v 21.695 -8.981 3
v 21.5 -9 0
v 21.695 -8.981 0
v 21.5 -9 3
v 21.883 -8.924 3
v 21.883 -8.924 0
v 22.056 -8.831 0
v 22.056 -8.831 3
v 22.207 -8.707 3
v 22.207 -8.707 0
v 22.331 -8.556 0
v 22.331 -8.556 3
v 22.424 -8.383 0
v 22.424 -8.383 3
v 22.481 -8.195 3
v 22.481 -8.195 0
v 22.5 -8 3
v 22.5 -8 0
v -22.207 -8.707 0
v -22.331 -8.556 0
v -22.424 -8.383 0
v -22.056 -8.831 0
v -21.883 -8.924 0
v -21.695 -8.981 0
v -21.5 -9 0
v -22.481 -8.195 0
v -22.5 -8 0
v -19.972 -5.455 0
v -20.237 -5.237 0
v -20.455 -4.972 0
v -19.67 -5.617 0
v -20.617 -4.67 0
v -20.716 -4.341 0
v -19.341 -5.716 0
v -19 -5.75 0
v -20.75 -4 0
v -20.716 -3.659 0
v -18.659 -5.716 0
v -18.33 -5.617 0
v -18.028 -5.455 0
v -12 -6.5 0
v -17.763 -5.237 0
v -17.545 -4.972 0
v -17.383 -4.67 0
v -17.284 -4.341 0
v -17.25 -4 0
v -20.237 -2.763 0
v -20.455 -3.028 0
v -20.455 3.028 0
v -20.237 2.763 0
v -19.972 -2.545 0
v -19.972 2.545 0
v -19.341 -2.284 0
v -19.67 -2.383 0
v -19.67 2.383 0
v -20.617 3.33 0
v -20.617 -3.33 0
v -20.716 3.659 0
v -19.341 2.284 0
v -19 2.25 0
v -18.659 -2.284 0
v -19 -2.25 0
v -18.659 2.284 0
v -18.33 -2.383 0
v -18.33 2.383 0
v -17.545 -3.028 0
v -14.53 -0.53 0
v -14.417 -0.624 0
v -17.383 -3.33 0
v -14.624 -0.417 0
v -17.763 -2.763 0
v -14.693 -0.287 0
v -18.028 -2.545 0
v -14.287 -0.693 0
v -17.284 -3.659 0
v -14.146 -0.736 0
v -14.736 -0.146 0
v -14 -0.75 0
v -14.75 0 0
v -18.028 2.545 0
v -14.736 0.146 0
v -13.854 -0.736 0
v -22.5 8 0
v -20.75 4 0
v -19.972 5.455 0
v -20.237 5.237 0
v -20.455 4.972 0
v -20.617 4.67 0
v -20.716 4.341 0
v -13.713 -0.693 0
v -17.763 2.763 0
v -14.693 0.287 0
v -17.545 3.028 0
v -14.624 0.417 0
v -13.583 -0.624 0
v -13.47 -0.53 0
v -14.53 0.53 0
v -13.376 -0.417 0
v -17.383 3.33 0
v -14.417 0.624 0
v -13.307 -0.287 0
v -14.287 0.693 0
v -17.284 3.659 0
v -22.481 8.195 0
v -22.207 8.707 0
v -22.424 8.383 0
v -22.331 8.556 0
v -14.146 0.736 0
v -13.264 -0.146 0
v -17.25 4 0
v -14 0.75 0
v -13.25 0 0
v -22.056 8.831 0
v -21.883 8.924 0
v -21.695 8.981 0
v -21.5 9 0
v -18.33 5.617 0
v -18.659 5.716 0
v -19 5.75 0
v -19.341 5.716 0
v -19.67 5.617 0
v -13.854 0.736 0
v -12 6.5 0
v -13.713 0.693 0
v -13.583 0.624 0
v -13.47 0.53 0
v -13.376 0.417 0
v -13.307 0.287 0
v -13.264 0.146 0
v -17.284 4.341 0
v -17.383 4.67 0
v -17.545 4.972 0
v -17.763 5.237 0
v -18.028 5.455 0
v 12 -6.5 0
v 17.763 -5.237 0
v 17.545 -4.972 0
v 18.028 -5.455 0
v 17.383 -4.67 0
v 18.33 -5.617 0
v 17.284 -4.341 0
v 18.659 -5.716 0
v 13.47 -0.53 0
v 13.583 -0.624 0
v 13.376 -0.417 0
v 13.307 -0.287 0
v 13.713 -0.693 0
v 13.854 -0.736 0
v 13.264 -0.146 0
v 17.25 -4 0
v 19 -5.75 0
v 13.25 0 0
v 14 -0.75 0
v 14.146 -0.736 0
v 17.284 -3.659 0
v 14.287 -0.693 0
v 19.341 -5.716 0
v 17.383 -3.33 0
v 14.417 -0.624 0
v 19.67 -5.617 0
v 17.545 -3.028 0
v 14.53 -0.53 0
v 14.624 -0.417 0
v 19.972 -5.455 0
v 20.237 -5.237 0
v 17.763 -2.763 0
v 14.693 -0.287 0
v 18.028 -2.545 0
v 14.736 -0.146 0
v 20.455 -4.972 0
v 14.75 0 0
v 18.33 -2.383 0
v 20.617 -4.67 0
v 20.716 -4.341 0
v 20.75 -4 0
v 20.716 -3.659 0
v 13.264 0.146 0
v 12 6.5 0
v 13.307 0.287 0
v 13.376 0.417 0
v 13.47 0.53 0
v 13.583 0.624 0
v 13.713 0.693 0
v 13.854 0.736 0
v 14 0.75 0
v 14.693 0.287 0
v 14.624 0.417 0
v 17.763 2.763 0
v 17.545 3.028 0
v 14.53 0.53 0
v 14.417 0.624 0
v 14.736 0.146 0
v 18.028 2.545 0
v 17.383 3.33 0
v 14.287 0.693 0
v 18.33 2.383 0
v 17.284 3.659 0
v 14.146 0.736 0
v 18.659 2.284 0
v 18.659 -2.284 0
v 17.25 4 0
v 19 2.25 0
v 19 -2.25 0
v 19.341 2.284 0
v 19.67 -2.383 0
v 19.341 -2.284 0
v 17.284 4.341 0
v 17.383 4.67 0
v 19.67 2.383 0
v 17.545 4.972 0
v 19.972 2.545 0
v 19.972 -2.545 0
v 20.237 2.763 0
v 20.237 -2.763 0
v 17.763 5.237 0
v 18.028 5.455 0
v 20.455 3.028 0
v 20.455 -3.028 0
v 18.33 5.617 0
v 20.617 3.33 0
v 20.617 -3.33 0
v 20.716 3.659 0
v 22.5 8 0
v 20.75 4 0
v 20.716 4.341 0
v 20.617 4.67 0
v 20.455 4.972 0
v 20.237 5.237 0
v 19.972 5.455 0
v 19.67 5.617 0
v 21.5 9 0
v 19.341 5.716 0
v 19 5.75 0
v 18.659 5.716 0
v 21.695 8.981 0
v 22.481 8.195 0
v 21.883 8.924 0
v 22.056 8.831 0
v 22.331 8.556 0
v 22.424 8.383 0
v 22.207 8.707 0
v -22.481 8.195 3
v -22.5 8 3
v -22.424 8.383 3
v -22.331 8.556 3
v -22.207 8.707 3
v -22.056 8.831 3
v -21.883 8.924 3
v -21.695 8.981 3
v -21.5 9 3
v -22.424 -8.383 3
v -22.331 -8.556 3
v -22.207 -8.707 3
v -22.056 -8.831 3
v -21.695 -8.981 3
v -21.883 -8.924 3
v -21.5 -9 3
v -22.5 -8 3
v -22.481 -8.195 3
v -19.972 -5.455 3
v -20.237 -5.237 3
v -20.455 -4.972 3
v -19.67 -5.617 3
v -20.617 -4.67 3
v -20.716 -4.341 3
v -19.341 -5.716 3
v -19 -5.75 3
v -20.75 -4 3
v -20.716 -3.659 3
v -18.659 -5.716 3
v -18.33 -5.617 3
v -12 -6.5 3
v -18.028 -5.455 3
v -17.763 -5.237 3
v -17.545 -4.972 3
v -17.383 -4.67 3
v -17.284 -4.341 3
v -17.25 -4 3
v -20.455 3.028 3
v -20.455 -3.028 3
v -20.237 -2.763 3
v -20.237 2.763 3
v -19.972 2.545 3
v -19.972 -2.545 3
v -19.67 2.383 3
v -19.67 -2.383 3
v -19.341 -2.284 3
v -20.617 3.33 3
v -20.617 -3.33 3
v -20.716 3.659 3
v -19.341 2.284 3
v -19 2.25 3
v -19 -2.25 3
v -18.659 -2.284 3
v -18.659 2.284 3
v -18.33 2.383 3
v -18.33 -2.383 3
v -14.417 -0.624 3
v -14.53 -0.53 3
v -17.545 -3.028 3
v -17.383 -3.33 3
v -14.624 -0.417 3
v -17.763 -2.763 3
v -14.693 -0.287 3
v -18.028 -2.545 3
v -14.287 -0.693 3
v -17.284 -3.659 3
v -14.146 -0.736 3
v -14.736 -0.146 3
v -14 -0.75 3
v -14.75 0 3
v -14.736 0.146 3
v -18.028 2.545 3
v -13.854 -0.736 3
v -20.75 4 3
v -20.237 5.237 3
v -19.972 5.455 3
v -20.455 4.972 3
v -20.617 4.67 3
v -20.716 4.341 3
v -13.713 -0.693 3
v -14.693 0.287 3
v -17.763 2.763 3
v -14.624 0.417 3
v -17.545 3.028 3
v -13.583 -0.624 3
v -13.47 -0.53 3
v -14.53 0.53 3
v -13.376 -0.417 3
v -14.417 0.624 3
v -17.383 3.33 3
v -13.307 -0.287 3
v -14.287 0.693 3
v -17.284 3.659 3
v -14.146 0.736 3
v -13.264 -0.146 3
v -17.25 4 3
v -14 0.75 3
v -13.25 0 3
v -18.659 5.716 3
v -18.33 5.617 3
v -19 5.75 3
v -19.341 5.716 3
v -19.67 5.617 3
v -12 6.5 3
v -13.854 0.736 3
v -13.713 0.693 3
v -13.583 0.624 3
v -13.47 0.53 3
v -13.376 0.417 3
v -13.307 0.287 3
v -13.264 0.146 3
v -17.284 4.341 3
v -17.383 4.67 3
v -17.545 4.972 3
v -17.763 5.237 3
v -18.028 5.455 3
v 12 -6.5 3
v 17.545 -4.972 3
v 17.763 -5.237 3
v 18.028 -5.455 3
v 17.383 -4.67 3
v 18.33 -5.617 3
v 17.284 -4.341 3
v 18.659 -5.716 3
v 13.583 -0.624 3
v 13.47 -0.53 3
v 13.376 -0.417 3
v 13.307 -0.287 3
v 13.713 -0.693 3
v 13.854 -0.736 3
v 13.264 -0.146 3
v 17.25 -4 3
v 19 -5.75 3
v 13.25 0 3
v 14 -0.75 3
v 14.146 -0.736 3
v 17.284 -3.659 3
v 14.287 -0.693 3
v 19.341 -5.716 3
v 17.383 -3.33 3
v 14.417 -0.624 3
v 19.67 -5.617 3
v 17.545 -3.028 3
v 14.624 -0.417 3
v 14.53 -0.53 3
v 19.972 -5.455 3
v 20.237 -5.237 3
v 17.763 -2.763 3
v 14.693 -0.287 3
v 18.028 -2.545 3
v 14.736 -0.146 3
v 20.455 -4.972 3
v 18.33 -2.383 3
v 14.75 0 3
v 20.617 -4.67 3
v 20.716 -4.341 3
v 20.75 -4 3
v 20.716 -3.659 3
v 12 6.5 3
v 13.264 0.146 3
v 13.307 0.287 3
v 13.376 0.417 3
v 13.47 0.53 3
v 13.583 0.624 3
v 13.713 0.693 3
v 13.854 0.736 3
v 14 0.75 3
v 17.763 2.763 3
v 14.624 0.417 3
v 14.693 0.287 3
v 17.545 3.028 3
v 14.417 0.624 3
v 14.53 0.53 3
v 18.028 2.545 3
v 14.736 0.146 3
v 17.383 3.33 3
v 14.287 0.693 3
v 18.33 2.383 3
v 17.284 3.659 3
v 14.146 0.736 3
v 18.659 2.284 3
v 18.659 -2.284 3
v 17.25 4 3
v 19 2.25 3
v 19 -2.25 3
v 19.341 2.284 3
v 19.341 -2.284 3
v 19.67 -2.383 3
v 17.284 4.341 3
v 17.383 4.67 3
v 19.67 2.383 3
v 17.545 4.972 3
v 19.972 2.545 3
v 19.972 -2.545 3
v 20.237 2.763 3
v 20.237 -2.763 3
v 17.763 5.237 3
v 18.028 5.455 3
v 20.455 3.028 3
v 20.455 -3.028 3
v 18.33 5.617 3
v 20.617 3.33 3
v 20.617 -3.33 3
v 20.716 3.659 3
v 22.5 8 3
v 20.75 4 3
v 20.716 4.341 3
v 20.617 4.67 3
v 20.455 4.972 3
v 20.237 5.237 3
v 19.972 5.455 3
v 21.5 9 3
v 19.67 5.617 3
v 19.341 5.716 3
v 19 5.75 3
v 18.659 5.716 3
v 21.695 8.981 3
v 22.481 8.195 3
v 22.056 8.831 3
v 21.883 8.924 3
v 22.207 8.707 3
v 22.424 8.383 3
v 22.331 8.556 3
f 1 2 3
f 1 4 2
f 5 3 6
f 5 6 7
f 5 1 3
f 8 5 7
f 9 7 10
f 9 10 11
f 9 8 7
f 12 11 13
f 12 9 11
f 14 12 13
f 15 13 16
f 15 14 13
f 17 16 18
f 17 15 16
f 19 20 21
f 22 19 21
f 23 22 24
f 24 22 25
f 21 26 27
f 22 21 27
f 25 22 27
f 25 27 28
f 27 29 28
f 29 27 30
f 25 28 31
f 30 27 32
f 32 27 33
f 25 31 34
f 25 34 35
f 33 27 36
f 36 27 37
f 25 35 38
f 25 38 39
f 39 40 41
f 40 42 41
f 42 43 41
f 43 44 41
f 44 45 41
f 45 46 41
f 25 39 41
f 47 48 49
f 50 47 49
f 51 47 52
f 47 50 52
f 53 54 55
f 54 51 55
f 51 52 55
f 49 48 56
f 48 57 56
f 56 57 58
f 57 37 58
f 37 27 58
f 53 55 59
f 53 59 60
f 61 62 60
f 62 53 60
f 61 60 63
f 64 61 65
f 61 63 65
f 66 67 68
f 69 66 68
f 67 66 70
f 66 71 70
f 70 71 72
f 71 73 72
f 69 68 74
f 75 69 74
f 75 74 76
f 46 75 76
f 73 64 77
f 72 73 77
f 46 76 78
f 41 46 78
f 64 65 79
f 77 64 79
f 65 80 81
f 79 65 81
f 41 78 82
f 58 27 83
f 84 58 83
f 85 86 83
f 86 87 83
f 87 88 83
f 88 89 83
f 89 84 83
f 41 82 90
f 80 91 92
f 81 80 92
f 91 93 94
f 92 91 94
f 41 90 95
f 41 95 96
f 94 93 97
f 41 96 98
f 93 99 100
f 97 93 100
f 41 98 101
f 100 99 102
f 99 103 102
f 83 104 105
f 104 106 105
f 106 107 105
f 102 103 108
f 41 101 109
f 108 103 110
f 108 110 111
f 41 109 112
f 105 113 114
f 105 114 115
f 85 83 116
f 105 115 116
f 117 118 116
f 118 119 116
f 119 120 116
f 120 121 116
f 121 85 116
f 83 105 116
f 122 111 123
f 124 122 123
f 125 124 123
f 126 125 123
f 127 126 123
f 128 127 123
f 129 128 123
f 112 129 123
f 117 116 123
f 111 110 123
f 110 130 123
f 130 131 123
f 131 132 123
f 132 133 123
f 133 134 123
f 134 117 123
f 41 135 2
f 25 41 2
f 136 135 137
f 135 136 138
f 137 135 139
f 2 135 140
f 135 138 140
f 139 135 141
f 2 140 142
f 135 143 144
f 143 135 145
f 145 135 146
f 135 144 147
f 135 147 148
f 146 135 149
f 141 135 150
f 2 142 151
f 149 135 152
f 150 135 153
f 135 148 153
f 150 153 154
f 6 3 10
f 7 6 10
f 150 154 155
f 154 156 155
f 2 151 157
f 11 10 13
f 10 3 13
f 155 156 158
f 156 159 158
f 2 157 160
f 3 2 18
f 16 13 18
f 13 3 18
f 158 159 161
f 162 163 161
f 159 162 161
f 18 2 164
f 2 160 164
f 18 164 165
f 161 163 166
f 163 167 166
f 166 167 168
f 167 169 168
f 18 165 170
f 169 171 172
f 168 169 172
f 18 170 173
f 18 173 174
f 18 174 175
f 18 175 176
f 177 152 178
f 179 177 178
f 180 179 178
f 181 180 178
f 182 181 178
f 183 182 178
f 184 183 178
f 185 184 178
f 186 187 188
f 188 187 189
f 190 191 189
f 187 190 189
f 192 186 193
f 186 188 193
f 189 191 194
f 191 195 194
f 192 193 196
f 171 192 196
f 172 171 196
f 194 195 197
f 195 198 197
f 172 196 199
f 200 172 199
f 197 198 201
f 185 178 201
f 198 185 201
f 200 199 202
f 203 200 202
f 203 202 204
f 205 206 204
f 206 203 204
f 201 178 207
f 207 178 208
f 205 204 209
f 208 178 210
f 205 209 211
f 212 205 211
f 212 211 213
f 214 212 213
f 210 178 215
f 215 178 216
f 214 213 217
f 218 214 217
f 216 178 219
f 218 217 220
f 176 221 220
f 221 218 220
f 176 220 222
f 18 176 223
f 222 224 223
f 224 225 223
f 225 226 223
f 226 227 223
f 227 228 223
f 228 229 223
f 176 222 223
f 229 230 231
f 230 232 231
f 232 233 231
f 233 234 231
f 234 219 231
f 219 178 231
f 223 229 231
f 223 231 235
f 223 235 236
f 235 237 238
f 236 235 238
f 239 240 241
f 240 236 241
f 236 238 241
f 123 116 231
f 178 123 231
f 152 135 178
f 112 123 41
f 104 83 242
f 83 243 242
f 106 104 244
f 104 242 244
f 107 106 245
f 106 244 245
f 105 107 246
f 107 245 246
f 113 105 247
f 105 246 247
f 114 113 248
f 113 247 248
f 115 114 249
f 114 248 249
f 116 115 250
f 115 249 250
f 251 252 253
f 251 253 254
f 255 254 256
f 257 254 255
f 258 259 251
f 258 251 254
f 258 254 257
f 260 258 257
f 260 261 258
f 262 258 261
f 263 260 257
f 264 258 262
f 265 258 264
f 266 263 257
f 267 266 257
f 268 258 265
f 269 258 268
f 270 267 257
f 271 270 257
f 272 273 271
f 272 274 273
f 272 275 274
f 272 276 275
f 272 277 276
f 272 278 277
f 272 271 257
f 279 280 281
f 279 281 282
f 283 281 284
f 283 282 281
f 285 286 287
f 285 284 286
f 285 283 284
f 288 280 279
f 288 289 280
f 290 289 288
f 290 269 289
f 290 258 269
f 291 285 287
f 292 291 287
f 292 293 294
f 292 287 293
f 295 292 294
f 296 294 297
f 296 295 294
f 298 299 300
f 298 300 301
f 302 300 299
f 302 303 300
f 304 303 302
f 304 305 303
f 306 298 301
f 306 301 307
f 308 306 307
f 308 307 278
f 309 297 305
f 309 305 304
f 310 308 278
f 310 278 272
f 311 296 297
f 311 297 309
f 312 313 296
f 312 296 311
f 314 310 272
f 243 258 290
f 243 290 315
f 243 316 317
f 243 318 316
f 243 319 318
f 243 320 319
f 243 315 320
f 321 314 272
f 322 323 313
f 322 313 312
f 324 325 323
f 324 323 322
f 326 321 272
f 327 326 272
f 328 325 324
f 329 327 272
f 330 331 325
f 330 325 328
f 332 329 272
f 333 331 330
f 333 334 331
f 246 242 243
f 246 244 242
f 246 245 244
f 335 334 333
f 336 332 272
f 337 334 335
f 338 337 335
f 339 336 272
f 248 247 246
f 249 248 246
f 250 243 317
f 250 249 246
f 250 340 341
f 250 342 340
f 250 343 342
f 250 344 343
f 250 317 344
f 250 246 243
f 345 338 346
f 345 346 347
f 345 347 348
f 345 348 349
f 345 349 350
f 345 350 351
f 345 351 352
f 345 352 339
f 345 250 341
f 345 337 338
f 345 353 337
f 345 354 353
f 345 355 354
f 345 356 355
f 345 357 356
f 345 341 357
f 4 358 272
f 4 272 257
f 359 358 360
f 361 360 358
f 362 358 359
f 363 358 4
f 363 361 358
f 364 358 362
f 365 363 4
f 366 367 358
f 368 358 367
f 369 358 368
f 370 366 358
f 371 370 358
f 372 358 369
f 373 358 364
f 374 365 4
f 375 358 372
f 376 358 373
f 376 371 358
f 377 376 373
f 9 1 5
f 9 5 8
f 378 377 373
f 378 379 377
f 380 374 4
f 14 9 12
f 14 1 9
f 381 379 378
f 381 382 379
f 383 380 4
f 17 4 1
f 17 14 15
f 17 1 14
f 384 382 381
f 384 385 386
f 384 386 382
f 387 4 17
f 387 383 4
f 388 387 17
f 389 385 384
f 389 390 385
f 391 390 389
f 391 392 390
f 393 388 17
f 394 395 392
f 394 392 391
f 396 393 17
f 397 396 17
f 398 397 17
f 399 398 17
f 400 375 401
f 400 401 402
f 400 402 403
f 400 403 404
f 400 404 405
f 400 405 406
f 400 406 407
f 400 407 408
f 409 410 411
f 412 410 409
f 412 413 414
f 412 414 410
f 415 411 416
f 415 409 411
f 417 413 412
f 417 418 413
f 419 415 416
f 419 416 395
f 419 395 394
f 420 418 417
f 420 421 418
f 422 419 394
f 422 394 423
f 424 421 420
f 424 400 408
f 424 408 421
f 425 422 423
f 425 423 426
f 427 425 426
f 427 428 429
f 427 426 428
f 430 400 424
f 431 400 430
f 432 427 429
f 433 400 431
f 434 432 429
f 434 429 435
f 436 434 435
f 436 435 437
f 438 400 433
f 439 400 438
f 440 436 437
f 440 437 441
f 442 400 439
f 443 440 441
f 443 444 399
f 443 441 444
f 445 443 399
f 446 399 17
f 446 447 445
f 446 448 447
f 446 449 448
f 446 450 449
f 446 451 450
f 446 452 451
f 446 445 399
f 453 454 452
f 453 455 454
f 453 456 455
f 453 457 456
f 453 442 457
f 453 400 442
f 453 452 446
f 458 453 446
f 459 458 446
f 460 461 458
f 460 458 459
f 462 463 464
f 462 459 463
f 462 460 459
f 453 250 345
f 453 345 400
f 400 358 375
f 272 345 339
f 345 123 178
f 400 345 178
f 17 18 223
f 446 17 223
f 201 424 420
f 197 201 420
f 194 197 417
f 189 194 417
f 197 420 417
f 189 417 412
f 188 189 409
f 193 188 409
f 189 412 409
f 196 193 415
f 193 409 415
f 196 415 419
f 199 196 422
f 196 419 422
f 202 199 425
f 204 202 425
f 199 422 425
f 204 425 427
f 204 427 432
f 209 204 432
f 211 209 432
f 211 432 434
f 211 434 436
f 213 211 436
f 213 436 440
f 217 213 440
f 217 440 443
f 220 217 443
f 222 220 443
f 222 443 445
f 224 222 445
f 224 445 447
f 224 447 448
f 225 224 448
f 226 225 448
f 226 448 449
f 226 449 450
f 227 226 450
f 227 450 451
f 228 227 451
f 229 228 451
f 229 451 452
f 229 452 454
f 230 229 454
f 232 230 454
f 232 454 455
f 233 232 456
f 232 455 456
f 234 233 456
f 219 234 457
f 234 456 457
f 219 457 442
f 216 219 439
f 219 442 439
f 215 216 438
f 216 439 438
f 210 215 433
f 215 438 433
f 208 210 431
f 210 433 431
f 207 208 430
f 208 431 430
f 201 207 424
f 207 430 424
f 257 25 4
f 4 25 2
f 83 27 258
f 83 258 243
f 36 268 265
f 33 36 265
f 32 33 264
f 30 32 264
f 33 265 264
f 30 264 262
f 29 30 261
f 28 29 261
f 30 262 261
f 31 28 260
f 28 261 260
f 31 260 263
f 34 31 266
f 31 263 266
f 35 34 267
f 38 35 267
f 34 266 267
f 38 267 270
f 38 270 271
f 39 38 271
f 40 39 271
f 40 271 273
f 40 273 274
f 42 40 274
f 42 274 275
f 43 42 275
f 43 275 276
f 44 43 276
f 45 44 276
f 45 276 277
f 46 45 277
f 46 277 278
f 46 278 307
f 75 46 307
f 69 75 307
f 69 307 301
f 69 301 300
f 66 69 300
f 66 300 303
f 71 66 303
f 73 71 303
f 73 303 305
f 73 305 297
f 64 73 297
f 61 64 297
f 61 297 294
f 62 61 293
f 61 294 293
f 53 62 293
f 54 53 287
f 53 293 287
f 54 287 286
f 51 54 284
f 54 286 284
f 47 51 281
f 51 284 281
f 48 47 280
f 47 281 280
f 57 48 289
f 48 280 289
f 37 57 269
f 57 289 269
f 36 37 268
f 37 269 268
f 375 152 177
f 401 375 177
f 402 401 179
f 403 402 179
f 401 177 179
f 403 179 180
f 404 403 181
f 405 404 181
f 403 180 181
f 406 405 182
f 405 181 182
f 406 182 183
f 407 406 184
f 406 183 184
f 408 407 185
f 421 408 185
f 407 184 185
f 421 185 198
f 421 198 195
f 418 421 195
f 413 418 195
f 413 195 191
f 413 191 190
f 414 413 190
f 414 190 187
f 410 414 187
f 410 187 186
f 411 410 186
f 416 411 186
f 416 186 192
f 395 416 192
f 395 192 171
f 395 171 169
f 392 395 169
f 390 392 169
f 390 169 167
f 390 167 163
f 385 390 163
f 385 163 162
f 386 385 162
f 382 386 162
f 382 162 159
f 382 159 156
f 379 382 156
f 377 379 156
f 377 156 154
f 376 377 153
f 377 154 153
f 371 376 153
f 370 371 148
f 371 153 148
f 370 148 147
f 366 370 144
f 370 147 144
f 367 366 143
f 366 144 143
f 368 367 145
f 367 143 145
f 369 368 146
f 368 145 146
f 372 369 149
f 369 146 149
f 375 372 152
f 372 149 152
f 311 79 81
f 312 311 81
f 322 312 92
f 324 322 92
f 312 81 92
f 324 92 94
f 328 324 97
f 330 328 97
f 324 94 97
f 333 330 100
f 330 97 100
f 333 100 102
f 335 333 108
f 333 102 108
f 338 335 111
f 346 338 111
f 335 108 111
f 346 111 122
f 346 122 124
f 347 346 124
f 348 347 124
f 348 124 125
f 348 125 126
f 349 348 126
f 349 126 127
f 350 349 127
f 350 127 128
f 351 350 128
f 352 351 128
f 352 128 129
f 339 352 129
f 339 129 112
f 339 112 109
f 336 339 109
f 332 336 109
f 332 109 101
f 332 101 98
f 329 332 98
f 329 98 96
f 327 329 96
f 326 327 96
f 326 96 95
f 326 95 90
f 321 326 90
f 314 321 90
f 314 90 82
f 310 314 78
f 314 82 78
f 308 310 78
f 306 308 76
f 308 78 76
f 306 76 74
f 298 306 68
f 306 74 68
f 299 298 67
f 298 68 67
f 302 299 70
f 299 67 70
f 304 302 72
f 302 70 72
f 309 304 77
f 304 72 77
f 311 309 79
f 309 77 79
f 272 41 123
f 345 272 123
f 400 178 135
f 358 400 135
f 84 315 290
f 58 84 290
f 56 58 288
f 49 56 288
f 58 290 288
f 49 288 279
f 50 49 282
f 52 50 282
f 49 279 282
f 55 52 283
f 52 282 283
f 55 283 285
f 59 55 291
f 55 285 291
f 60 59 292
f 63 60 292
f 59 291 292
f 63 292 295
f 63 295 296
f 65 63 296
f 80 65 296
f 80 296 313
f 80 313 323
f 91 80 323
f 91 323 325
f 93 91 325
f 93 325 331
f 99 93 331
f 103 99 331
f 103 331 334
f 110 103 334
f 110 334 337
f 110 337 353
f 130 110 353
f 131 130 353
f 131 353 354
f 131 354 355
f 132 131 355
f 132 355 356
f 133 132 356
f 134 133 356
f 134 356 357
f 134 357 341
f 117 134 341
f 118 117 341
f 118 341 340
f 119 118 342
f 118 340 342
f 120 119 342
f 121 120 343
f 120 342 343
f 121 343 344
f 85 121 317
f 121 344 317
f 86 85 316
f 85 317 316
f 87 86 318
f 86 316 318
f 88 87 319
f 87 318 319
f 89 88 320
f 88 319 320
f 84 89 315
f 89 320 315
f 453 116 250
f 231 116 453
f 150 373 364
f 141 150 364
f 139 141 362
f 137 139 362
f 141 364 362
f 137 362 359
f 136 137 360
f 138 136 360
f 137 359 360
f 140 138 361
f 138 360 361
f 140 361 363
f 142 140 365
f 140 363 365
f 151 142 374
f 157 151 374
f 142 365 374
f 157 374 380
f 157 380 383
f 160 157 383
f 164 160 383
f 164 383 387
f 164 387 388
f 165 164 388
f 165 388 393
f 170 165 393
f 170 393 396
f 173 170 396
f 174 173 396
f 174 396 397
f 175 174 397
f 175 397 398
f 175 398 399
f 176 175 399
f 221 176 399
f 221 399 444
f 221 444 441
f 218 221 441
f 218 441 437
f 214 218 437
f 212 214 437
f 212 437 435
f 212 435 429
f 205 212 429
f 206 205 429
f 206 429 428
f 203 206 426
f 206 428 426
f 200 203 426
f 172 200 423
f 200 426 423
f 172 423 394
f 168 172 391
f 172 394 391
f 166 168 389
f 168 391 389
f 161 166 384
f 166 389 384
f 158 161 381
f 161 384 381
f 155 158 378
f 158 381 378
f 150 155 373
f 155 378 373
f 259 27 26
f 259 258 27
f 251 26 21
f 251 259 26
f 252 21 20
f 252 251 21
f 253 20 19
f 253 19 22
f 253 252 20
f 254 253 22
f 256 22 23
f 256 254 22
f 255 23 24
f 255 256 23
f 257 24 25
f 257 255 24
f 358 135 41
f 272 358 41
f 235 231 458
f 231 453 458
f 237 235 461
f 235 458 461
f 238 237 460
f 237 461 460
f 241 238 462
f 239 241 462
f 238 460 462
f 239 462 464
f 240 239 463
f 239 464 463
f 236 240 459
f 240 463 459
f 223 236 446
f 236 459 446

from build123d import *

# Parameters (mm, degrees)
F0_W     = 45
F0_H     = 18
F0_W_2   = 7
F0_H_2   = 8
F1_DEPTH = 3
F2_D     = 3.5
F3_R     = 1
F5_D     = 1.5


with BuildPart() as f1:
    # F0 (on Top) → F1 (new body)
    with BuildSketch(Plane.XY):
        Rectangle(F0_W, F0_H)
        Polygon((19, 4), (19, -4), (12, -4), (12, -6.5), (-12, -6.5), (-12, -4), (-19, -4), (-19, 4), (-12, 4), (-12, 6.5), (12, 6.5), (12, 4), align=None, mode=Mode.SUBTRACT)
        with Locations((15.5, 0)):
            Rectangle(F0_W_2, F0_H_2)
        with Locations((-15.5, 0)):
            Rectangle(F0_W_2, F0_H_2)
    extrude(amount=F1_DEPTH)

    # F2 (through all)
    with Locations(Plane(origin=(0, 0, 0), x_dir=(1, 0, 0), z_dir=(0, 0, -1))):
        with Locations((-19, 4), (-19, -4), (19, -4), (19, 4)):
            Hole(F2_D / 2)

    # F3
    f3_edges = [f1.edges().sort_by_distance(p)[0] for p in [
        (22.5, 9, 1.5),
        (22.5, -9, 1.5),
        (-22.5, -9, 1.5),
        (-22.5, 9, 1.5),
    ]]
    fillet(f3_edges, radius=F3_R)

    # F5 (through all)
    with Locations(Plane.XY.offset(3)):
        with Locations((-14, 0), (14, 0)):
            Hole(F5_D / 2)


solid = f1.part
